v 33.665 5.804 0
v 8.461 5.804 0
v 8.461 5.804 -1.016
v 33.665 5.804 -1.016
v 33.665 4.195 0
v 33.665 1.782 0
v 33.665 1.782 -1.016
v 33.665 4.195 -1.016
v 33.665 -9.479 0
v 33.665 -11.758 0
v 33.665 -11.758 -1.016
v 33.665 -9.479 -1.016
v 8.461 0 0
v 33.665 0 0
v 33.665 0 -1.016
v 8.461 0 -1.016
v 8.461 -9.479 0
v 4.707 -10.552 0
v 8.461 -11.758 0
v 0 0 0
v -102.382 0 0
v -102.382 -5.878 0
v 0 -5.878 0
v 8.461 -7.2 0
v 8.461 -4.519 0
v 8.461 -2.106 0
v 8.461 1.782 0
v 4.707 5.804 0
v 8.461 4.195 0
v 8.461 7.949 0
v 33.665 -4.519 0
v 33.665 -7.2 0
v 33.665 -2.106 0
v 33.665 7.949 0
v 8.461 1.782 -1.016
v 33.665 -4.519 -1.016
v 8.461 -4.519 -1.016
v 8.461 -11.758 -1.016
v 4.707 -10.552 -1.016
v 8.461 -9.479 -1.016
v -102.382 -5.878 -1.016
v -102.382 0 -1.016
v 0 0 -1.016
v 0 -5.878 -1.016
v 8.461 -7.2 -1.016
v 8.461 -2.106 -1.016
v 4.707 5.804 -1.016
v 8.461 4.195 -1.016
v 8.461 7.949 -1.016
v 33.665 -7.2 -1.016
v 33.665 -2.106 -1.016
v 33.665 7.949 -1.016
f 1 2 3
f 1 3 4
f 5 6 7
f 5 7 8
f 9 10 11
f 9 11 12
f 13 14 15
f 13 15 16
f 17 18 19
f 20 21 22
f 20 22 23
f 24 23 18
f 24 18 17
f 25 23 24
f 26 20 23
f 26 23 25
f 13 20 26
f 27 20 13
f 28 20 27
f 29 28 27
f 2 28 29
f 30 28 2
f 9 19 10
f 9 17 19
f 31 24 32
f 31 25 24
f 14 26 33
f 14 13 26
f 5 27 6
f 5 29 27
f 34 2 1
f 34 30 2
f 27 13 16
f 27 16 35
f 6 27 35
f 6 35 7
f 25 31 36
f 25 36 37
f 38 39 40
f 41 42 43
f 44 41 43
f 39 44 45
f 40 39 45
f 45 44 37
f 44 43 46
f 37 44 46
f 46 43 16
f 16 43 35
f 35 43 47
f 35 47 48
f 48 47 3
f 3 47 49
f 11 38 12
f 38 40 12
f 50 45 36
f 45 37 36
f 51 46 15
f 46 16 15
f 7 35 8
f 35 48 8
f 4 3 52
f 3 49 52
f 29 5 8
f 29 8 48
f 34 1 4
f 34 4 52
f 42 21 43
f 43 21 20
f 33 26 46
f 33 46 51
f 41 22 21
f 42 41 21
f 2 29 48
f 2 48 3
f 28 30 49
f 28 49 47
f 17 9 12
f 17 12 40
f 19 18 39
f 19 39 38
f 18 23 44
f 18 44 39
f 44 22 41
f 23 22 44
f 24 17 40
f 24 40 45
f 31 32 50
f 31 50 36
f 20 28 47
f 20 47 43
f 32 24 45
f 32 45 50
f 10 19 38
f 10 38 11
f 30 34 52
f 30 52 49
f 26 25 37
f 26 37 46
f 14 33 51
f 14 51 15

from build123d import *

# Parameters (mm, degrees)
F0_W     = 102.382466
F0_H     = 5.877512
F1_DEPTH = 1.016


with BuildPart() as f1:
    # F0 (on Top) → F1 (new body)
    with BuildSketch(Plane.XY):
        with Locations((-51.191233, -2.938756)):
            Rectangle(F0_W, F0_H)
        Polygon((4.706718, 5.804283), (0, 0), (0, -5.877512), (4.706718, -10.5517), (8.460551, -11.758289), (33.664852, -11.758289), (33.664852, -9.479176), (8.460551, -9.479176), (8.460551, -7.200064), (33.664852, -7.200064), (33.664852, -4.518756), (8.460551, -4.518756), (8.460551, -2.105578), (33.664852, -2.105578), (33.664852, 0), (8.460551, 0), (8.460551, 1.78232), (33.664852, 1.78232), (33.664852, 4.195498), (8.460551, 4.195498), (8.460551, 5.804283), (33.664852, 5.804283), (33.664852, 7.94933), (8.460551, 7.94933), align=None)
    extrude(amount=-F1_DEPTH)


solid = f1.part
